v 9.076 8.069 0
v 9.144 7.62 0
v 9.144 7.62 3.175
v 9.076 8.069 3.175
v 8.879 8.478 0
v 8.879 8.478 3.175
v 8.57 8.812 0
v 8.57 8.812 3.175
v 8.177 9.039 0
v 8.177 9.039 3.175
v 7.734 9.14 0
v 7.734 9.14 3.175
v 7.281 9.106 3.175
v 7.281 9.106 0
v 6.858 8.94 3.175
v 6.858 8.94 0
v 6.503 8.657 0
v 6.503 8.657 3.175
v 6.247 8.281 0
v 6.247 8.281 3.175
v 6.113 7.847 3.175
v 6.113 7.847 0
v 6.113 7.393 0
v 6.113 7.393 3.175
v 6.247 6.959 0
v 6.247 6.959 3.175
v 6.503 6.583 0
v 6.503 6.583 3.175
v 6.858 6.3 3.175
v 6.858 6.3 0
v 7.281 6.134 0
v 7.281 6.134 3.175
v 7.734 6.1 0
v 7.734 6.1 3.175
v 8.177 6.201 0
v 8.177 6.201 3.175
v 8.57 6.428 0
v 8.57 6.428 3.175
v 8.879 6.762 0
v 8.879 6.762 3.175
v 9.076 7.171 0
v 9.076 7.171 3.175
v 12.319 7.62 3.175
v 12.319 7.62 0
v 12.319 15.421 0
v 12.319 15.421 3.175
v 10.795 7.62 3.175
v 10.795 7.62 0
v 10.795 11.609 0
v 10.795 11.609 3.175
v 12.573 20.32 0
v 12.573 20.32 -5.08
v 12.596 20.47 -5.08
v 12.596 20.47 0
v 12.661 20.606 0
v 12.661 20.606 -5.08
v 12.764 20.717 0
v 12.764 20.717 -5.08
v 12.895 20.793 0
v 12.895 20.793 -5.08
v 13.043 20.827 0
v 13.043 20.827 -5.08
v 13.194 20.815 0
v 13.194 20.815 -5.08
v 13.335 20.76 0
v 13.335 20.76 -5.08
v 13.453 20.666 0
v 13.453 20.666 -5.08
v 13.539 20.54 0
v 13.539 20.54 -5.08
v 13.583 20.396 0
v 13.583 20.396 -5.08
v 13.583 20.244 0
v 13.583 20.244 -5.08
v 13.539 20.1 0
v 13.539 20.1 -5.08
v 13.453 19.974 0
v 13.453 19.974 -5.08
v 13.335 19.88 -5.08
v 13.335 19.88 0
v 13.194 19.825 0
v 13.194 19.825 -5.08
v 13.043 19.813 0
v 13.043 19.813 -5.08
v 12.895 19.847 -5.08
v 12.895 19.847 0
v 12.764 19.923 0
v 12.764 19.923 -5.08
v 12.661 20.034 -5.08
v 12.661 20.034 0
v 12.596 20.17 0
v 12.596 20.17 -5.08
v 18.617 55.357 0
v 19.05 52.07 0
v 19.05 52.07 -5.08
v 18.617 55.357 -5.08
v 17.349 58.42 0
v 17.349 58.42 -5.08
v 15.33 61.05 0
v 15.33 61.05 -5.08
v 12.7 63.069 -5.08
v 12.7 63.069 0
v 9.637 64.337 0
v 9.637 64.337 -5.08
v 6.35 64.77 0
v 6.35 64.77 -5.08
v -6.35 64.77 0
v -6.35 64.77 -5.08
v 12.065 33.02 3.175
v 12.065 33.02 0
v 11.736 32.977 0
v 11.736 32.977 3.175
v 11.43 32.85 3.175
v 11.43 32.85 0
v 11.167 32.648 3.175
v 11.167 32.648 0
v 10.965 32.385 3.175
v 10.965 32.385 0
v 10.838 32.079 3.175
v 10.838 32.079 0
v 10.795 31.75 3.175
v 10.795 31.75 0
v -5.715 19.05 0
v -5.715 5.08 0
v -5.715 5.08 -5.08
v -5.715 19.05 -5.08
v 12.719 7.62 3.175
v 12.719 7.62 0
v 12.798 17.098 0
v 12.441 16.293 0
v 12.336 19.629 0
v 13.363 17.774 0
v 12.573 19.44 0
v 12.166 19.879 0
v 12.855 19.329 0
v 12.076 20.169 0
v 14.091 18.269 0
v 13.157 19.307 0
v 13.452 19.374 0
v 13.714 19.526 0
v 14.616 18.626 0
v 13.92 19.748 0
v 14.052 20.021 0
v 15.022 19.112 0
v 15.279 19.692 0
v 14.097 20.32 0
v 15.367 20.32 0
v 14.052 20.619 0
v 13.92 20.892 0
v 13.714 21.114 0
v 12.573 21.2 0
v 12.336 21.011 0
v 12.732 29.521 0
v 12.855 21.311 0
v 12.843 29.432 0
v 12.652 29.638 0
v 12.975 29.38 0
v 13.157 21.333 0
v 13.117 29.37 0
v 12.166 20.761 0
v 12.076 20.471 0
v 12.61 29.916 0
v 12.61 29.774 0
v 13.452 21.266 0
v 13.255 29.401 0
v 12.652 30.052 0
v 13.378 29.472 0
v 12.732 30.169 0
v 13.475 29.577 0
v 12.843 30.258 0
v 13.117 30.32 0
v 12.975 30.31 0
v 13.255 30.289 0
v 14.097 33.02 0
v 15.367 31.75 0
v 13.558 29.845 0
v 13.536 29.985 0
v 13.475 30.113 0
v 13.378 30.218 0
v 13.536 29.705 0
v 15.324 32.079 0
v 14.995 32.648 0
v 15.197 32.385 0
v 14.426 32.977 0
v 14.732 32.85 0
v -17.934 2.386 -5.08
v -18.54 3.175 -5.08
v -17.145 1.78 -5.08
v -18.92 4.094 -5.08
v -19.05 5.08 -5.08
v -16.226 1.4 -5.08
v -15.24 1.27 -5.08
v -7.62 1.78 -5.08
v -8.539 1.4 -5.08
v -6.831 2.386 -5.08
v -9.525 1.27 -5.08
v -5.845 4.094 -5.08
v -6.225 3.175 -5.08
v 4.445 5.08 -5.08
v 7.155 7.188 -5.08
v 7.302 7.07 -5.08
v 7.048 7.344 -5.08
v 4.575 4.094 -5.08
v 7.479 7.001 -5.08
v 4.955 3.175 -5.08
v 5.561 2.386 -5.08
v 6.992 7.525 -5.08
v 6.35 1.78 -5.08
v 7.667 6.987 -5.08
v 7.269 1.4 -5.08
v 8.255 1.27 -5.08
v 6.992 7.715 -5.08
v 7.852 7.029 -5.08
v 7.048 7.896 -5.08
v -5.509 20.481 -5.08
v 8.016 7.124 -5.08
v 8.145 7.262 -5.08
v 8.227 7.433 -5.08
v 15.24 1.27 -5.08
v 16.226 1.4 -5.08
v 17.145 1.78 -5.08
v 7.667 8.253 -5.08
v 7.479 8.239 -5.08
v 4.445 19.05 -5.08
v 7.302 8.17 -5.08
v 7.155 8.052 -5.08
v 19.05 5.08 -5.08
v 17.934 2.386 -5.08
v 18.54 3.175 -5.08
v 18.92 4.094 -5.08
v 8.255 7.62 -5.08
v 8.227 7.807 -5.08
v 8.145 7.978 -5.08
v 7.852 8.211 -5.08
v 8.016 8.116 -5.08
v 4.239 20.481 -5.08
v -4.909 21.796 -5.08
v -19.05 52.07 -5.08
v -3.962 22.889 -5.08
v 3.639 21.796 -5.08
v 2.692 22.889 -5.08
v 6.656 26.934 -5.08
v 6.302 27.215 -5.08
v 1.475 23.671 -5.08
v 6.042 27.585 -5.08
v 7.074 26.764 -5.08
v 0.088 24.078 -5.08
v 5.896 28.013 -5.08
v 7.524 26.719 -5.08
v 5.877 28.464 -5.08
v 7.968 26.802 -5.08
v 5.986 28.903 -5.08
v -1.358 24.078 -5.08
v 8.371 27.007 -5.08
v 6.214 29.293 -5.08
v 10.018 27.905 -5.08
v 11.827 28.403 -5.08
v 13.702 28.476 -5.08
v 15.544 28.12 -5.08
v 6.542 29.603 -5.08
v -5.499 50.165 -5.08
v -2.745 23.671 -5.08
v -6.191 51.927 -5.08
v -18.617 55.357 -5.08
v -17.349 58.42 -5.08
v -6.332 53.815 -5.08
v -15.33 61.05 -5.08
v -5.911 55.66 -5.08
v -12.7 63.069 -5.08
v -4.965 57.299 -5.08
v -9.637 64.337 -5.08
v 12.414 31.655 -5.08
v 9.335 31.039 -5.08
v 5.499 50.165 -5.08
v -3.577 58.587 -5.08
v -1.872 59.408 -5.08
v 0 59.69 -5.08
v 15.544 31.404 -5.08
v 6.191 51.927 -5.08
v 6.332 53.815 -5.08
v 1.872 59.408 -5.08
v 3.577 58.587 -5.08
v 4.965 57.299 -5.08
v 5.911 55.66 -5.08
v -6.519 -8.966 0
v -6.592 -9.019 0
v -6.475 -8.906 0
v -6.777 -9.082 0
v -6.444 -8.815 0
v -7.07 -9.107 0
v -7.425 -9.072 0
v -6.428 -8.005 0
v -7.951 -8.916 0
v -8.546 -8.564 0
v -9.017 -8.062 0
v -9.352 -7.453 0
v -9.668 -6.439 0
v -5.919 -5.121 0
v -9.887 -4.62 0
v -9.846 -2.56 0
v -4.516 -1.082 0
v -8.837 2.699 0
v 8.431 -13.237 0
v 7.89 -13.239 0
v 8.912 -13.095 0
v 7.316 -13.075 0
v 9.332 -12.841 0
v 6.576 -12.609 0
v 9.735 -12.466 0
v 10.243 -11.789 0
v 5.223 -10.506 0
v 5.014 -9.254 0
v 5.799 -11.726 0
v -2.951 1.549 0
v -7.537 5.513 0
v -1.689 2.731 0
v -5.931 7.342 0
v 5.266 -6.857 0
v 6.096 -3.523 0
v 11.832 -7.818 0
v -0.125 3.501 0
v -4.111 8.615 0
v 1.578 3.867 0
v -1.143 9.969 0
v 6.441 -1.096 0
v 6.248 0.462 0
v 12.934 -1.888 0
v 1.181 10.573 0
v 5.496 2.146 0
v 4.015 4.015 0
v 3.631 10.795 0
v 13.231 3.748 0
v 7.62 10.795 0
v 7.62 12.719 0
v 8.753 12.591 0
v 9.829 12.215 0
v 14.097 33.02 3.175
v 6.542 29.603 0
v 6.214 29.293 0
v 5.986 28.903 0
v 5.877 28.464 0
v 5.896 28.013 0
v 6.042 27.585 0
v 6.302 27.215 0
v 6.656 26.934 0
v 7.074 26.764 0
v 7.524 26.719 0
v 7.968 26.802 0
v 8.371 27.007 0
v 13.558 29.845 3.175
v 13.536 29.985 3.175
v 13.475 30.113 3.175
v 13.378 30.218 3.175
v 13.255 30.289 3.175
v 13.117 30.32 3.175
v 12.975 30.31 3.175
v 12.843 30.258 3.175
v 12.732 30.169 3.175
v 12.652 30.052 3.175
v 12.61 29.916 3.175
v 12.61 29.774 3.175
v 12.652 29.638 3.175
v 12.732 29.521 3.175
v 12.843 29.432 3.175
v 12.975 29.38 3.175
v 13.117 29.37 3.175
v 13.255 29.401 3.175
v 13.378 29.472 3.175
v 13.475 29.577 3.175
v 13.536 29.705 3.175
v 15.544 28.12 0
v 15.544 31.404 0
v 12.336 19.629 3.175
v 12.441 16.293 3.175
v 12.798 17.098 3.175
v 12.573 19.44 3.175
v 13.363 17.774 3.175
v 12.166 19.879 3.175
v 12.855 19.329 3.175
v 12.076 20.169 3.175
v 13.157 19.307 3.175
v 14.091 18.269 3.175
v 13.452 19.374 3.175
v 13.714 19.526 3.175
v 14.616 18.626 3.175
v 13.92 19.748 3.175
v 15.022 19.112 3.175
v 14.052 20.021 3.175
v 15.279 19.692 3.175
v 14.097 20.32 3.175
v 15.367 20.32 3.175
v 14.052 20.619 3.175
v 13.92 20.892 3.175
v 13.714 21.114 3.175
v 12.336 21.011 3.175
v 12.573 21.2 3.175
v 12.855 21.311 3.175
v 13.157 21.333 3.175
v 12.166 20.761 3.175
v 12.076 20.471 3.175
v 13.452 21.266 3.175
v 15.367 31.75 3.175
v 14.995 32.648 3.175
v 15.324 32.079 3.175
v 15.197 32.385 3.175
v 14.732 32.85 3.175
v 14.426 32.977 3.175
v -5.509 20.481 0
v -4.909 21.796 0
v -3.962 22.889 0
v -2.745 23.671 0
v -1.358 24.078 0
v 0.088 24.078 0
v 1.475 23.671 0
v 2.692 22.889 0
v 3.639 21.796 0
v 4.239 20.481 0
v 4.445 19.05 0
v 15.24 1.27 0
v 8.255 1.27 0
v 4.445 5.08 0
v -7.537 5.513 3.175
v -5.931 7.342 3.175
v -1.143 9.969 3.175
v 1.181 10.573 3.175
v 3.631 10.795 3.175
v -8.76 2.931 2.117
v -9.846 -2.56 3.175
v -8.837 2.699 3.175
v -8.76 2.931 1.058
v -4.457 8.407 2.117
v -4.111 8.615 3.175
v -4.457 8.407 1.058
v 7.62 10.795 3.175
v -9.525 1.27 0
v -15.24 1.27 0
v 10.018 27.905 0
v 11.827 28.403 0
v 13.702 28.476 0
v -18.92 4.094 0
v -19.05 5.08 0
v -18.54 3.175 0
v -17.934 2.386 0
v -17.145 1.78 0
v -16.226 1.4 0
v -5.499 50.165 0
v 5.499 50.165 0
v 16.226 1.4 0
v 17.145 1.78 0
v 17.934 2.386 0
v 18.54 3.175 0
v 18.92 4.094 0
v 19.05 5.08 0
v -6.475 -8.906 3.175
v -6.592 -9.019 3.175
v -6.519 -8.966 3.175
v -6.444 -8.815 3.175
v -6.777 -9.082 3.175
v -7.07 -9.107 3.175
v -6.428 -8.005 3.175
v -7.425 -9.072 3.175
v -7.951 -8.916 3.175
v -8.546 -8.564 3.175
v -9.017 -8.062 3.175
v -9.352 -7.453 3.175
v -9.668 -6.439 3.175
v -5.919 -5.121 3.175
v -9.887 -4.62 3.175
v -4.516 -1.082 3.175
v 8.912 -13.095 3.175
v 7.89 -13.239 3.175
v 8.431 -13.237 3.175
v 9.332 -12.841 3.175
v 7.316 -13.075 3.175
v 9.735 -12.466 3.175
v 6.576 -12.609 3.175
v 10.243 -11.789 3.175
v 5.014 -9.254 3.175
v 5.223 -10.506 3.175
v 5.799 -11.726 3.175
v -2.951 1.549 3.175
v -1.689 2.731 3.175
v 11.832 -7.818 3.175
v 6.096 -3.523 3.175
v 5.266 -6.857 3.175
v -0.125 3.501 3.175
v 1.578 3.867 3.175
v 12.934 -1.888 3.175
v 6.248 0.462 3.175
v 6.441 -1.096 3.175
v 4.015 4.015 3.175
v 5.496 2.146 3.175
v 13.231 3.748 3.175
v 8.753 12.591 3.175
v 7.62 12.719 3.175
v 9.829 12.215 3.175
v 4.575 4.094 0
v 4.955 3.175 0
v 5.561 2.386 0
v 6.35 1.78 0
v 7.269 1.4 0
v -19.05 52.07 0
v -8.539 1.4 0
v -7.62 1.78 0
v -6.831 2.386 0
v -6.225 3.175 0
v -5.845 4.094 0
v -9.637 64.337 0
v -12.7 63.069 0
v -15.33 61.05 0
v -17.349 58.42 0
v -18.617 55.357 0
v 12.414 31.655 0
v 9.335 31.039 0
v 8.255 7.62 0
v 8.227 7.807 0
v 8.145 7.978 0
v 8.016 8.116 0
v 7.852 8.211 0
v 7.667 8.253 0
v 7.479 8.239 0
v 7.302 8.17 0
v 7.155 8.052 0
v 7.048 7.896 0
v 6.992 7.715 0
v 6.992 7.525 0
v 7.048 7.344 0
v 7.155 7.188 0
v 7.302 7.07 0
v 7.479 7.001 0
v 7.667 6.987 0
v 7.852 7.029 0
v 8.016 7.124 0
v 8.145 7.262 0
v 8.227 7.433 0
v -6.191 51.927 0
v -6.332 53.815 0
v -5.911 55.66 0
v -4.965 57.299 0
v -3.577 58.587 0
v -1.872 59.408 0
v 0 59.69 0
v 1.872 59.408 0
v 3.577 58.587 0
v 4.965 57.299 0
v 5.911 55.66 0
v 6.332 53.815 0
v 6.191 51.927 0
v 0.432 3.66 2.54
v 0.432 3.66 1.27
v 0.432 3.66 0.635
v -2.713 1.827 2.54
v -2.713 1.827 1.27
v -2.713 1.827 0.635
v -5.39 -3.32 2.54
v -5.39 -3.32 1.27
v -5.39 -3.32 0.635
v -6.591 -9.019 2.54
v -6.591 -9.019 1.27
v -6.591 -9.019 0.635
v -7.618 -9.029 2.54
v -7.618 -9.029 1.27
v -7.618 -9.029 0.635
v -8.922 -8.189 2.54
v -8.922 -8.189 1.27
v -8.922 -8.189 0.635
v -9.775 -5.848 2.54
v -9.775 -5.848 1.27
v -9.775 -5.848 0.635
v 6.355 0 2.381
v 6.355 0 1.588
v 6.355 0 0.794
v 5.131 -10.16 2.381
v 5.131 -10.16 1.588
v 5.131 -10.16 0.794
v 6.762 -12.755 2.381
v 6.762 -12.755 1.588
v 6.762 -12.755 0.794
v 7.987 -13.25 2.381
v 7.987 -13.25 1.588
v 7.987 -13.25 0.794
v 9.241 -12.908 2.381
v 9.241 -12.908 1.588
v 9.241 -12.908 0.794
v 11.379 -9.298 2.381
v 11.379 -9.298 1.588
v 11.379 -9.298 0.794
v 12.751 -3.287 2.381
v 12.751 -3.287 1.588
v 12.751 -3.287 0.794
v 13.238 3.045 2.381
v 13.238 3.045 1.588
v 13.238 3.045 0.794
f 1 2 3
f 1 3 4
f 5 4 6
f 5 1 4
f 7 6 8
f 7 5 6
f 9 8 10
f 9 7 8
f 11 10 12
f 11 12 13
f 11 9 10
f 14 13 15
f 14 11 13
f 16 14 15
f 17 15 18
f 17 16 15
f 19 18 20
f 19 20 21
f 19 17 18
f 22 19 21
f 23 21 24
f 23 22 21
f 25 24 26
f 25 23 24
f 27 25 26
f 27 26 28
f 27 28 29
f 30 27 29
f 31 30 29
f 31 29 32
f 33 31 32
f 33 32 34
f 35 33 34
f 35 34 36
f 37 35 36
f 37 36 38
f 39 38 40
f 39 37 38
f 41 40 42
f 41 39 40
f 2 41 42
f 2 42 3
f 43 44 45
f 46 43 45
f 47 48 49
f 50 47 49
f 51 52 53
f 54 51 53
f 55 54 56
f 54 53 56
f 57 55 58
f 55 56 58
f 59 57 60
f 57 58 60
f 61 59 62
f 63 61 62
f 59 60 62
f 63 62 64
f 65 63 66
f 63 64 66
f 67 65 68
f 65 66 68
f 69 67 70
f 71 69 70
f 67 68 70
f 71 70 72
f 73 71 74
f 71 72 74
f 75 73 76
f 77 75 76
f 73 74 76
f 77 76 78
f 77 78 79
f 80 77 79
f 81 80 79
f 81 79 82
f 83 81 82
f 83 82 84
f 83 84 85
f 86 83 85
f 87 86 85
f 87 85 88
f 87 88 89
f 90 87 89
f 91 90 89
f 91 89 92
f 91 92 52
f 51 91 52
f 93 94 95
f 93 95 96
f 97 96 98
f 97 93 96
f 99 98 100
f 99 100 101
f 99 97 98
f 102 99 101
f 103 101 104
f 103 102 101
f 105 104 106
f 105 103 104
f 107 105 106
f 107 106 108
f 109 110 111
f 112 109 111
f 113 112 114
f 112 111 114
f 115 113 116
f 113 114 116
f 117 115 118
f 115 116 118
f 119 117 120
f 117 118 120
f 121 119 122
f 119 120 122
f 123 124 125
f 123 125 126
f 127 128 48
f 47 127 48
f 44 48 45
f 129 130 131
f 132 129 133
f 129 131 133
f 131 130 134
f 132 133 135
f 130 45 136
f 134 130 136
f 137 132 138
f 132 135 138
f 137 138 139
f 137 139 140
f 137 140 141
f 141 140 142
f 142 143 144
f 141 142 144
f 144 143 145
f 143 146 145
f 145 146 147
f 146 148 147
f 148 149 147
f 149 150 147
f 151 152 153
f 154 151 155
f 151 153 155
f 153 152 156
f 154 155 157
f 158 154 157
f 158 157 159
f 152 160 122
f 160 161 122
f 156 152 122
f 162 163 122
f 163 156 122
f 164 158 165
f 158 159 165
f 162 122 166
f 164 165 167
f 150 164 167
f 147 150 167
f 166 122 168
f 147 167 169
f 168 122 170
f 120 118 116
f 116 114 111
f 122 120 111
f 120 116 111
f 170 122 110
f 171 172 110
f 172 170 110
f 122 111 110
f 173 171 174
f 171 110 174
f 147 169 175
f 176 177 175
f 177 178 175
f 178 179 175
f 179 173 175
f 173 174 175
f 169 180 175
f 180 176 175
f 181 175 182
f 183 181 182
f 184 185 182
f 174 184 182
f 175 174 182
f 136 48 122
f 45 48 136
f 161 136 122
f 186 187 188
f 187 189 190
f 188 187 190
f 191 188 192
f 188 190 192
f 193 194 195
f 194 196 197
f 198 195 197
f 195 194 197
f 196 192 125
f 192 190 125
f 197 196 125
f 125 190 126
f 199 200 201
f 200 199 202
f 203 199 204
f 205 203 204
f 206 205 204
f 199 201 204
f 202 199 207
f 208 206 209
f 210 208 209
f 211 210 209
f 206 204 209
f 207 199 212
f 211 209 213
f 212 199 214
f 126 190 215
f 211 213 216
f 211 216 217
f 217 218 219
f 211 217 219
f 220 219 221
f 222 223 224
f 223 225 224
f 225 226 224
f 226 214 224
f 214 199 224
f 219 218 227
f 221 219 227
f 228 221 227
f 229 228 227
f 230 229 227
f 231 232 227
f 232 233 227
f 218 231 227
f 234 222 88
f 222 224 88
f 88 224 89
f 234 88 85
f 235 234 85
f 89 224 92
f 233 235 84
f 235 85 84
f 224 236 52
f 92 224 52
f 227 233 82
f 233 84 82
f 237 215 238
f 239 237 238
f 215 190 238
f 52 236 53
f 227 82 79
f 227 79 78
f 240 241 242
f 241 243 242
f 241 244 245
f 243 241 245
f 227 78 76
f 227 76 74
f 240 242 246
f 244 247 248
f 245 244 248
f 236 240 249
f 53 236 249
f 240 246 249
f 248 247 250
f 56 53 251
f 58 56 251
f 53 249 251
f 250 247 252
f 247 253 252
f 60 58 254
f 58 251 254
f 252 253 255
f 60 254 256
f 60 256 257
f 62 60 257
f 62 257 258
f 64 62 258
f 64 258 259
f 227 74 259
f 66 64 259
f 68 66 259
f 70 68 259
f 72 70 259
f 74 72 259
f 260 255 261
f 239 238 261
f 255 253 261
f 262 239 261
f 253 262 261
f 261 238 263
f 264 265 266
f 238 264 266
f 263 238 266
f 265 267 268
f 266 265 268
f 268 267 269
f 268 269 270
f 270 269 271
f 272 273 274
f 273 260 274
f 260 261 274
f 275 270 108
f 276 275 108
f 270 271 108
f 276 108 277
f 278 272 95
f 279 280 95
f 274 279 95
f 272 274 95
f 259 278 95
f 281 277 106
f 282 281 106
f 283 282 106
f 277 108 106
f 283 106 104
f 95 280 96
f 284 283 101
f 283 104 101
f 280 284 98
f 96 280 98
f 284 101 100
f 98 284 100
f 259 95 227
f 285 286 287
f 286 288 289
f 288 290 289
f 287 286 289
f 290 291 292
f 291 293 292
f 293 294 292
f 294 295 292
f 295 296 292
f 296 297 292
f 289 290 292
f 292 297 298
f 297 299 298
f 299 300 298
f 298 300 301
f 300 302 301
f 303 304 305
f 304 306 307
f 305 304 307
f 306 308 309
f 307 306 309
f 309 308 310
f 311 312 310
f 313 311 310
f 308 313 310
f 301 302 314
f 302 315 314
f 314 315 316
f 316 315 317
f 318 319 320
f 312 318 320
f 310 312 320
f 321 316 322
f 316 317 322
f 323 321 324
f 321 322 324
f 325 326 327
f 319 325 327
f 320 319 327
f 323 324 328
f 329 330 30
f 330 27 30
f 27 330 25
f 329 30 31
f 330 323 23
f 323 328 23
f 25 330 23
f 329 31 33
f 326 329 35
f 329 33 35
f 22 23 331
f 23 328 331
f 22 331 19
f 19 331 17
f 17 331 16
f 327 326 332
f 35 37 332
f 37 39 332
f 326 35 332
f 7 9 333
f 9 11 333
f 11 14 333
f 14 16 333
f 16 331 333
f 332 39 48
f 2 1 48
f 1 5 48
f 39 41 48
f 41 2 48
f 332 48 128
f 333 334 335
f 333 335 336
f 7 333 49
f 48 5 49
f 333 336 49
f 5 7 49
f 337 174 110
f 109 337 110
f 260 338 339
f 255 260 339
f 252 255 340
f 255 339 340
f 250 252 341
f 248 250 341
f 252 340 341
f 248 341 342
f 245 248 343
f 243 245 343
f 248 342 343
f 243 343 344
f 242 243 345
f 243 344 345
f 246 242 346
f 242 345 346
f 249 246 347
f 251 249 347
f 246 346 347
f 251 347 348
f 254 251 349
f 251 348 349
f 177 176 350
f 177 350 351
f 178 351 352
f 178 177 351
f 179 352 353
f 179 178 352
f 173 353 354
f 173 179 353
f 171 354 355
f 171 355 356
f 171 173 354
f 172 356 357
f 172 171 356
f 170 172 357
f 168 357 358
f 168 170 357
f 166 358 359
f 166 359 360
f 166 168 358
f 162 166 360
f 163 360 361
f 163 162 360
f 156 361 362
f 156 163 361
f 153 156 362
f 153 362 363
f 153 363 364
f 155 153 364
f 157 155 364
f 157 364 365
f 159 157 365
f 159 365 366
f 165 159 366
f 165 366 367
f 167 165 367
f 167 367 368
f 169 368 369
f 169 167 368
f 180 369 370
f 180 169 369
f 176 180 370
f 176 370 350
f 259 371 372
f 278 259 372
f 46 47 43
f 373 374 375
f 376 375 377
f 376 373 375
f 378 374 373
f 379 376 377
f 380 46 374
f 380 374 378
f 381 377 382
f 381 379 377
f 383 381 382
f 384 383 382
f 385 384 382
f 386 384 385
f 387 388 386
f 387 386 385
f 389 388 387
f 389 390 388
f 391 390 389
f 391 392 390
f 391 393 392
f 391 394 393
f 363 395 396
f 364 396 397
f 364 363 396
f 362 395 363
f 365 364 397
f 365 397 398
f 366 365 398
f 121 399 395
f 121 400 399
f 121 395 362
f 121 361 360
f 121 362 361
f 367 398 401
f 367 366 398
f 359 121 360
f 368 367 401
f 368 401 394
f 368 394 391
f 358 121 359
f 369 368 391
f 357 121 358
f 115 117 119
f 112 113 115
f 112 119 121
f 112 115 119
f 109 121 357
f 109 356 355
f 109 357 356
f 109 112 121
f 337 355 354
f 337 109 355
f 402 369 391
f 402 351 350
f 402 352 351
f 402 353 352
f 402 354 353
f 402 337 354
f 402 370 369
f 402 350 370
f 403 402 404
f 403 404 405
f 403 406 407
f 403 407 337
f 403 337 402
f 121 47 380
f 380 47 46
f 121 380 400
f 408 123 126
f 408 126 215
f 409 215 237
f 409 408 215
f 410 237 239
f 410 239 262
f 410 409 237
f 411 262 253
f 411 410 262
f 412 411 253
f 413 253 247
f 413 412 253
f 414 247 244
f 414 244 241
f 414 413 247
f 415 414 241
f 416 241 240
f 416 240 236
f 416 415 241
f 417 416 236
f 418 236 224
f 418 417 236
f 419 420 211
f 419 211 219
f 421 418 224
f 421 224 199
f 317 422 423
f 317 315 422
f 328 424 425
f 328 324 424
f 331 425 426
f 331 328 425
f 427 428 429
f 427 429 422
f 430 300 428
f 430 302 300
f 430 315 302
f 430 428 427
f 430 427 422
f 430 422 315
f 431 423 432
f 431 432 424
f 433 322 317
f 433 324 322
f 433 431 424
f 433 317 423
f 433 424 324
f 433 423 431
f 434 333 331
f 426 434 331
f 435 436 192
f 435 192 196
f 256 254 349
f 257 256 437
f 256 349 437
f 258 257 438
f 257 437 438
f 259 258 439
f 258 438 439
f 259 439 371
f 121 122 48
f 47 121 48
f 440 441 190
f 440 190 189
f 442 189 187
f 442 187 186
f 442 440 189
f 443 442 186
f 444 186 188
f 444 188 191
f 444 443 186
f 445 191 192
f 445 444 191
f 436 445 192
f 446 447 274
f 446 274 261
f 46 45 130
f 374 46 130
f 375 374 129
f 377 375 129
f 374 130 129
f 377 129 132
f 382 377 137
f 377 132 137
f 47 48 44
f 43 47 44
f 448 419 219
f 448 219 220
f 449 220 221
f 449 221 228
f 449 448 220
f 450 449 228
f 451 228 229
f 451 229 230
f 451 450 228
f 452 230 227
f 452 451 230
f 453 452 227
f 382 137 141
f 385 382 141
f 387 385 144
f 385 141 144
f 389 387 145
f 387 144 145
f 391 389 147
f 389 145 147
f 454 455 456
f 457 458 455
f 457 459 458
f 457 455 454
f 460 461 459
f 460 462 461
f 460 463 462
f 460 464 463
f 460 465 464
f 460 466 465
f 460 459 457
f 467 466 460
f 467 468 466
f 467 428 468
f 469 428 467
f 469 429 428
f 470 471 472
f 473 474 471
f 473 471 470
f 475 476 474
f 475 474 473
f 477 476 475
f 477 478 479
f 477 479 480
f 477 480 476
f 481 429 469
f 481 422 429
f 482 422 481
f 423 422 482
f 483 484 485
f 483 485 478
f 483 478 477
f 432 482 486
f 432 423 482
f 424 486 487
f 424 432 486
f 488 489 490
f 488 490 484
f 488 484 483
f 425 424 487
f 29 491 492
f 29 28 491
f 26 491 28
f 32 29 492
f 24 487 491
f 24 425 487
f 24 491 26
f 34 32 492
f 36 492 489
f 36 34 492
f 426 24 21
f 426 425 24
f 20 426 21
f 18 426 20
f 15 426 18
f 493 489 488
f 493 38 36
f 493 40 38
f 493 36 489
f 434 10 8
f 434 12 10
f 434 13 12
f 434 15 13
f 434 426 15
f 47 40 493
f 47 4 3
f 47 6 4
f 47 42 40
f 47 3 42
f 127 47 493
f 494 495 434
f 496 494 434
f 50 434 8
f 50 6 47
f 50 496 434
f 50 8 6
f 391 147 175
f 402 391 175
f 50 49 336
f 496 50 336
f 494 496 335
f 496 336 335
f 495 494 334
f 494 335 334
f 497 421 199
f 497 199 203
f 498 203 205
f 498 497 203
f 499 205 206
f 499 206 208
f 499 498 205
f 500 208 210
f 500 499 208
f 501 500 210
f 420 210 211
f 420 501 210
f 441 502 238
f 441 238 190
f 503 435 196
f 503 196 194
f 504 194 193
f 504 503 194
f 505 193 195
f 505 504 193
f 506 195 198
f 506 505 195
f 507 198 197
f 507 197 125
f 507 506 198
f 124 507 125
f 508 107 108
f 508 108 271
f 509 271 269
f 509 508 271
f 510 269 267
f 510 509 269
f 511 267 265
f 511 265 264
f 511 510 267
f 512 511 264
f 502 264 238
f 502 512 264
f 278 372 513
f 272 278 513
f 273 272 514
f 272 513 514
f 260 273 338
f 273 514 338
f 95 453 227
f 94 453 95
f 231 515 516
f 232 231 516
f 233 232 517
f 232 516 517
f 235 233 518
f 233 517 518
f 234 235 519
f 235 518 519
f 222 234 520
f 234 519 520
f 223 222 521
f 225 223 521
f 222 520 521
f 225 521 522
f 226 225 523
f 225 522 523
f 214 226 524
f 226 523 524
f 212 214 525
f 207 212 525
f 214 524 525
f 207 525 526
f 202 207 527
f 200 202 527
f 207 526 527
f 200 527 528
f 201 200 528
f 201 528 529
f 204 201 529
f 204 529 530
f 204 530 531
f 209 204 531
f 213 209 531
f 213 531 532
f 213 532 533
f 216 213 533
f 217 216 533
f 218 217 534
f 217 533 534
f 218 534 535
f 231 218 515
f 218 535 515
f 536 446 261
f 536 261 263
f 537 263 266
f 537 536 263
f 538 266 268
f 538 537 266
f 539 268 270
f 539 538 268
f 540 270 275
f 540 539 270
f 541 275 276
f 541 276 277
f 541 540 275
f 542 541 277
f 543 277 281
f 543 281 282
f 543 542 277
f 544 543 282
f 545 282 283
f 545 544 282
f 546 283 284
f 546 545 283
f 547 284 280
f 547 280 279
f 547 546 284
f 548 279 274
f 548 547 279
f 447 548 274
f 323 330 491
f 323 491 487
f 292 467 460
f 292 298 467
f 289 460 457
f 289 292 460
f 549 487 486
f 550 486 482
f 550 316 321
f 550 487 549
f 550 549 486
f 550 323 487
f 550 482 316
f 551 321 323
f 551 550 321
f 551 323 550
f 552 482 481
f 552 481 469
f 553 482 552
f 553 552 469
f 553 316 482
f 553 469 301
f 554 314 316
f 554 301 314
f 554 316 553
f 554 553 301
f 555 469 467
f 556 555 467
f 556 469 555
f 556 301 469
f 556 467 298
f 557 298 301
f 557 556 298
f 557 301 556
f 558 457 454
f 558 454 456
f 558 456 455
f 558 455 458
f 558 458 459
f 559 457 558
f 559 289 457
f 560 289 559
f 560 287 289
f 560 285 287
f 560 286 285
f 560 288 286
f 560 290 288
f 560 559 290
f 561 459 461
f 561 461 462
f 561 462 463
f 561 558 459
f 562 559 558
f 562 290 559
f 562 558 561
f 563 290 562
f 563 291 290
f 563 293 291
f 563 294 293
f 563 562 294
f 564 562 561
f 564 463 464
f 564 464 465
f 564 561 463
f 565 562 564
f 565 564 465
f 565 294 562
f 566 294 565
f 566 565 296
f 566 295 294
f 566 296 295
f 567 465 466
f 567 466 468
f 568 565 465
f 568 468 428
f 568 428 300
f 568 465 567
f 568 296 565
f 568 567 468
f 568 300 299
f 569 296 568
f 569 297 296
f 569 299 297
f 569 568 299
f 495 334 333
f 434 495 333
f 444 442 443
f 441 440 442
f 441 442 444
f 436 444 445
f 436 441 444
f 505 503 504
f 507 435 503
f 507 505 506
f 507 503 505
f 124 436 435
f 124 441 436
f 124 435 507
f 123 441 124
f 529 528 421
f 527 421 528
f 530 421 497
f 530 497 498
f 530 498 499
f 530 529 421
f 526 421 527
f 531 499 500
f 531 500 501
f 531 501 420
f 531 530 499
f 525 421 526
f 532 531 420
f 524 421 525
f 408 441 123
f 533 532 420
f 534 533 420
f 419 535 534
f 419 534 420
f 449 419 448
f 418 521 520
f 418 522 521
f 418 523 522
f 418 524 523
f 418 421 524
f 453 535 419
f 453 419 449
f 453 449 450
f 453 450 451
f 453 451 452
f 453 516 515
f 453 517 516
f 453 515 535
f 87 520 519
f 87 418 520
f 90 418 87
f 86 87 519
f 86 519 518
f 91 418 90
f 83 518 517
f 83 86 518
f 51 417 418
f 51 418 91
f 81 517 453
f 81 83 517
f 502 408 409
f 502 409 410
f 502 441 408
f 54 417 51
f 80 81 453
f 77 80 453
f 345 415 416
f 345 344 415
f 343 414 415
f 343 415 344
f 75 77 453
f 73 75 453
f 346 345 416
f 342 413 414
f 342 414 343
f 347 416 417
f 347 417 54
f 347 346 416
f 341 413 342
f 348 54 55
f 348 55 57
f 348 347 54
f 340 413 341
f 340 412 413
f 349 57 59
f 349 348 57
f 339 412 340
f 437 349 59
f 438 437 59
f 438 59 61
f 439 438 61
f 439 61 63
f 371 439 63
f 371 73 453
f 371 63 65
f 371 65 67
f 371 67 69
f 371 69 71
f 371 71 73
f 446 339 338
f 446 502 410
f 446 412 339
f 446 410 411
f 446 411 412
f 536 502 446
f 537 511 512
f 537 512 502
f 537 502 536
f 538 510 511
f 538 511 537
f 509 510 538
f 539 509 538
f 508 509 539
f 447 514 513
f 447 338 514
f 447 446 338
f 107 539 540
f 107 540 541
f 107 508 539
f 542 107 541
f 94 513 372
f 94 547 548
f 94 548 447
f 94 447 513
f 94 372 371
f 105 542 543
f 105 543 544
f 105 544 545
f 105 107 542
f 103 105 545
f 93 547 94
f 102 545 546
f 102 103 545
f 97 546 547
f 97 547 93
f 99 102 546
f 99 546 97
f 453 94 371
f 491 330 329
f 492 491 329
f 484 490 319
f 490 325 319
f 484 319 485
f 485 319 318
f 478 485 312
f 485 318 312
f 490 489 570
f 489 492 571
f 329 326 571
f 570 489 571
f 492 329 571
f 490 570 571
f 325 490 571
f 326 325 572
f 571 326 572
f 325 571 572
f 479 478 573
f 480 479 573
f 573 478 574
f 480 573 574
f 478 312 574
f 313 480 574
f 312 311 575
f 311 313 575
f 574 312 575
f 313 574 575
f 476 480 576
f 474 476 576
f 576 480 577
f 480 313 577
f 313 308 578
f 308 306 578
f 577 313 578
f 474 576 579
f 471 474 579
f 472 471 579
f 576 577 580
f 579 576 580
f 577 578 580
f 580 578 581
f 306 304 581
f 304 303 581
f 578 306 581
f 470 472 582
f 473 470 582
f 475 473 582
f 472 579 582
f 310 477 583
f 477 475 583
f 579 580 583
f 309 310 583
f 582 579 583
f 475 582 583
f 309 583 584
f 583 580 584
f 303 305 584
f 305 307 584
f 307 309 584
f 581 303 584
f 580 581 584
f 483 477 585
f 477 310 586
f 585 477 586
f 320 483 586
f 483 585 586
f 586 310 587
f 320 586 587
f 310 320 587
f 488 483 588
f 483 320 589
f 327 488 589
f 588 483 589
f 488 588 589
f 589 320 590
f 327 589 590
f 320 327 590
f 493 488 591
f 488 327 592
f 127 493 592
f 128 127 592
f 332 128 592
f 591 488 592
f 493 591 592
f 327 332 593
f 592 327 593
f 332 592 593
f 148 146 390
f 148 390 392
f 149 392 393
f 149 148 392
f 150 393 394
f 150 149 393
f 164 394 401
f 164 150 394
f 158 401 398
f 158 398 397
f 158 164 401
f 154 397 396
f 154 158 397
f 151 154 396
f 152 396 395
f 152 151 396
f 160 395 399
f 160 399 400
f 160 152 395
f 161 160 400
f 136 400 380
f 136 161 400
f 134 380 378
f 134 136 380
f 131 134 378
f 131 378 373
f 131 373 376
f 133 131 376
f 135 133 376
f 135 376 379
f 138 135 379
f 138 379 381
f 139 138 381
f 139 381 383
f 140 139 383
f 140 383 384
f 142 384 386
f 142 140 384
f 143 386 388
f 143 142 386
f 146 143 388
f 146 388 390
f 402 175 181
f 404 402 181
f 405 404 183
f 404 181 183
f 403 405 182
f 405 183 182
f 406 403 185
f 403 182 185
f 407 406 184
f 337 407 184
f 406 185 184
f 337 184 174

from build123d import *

# Parameters (mm, degrees)
F0_R     = 1.524
F1_DEPTH = 3.175
F2_R     = 0.635
F3_DEPTH = 5.08
F4_R     = 1.016
F4_R_2   = 0.4765946888
F5_DEPTH = 3.175
F6_D     = 1.016
F8_DEPTH = 25.4


with BuildPart() as f1:
    # F0 (on Top) → F1 (new body)
    with BuildSketch(Plane.XY):
        with BuildLine():
            add(Edge.make_bspline(
                [(4.0146798487, 4.0146798487), (4.1965253446, 3.8388911287), (8.6034145204, -0.4632855785), (2.7081005667, -9.8256704348), (11.7725199973, -17.5553609081), (14.1365779009, 3.6148799922), (12.7186926547, 7.62)],
                knots=[0.342546698, 0.342546698, 0.342546698, 0.342546698, 0.4592804701, 0.6325061967, 0.7529179928, 1, 1, 1, 1], degree=3))
            Line((12.7186926547, 7.62), (10.795, 7.62))
            Line((10.795, 7.62), (10.795, 11.6094914196))
            ThreePointArc((10.795, 11.6094914196), (9.3015879683, 12.4334113363), (7.62, 12.7186926547))
            Line((7.62, 12.7186926547), (7.62, 10.795))
            Line((7.62, 10.795), (3.6305085804, 10.795))
            add(Edge.make_bspline(
                [(-9.8462747246, -2.5595309993), (-9.7056248656, -0.6525965961), (-8.5851336869, 4.887523046), (-4.9223199156, 8.8010582074), (0.6214204647, 10.795), (3.6305085804, 10.795)],
                knots=[0.5944478908, 0.5944478908, 0.5944478908, 0.5944478908, 0.6806042793, 0.8326685389, 1, 1, 1, 1], degree=3))
            add(Edge.make_bspline(
                [(-9.8462747246, -2.5595309993), (-8.3692950914, 1.0159390836), (-1.2709087492, 7.2679963496), (3.9839462531, 4.0422517138), (3.9949946041, 4.0337094316), (4.0146798487, 4.0146798487)],
                knots=[0.0522687231, 0.0522687231, 0.0522687231, 0.0522687231, 0.2064144516, 0.3299099657, 0.342546698, 0.342546698, 0.342546698, 0.342546698], degree=3))
        make_face()
        with Locations((7.62, 7.62)):
            Circle(F0_R, mode=Mode.SUBTRACT)
        with BuildLine():
            add(Edge.make_bspline(
                [(4.0146798487, 4.0146798487), (1.5786877312, 3.9404286991), (-3.8406877482, 3.7898553775), (-6.77720019, -7.7849709454), (-6.196463978, -9.2958597248), (-9.5973471823, -8.9863377062), (-10.0193170502, -4.9056432962), (-9.8462747246, -2.5595309993)],
                knots=[0, 0, 0, 0, 0.1532538956, 0.3403377332, 0.3978065221, 0.4884491935, 0.5944478908, 0.5944478908, 0.5944478908, 0.5944478908], degree=3))
            add(Edge.make_bspline(
                [(-9.8462747246, -2.5595309993), (-8.3692950914, 1.0159390836), (-1.2709087492, 7.2679963496), (3.9839462531, 4.0422517138), (3.9949946041, 4.0337094316), (4.0146798487, 4.0146798487)],
                knots=[0.0522687231, 0.0522687231, 0.0522687231, 0.0522687231, 0.2064144516, 0.3299099657, 0.342546698, 0.342546698, 0.342546698, 0.342546698], degree=3))
        make_face()
    extrude(amount=F1_DEPTH)


with BuildPart() as f3:
    # F2 (on Top) → F3 (new body)
    with BuildSketch(Plane.XY):
        with BuildLine():
            Line((6.35, 64.77), (-6.35, 64.77))
            ThreePointArc((-6.35, 64.77), (-15.3302561211, 61.0502561211), (-19.05, 52.07))
            Line((-19.05, 52.07), (-19.05, 5.08))
            ThreePointArc((-19.05, 5.08), (-17.9340768363, 2.3859231637), (-15.24, 1.27))
            Line((-15.24, 1.27), (-9.525, 1.27))
            ThreePointArc((-9.525, 1.27), (-6.8309231637, 2.3859231637), (-5.715, 5.08))
            Line((-5.715, 5.08), (-5.715, 19.05))
            ThreePointArc((-5.715, 19.05), (-0.635, 24.13), (4.445, 19.05))
            Line((4.445, 19.05), (4.445, 5.08))
            ThreePointArc((4.445, 5.08), (5.5609231637, 2.3859231637), (8.255, 1.27))
            Line((8.255, 1.27), (15.24, 1.27))
            ThreePointArc((15.24, 1.27), (17.9340768363, 2.3859231637), (19.05, 5.08))
            Line((19.05, 5.08), (19.05, 52.07))
            ThreePointArc((19.05, 52.07), (15.3302561211, 61.0502561211), (6.35, 64.77))
        make_face()
        with Locations((7.62, 7.62)):
            Circle(F2_R, mode=Mode.SUBTRACT)
        with BuildLine():
            ThreePointArc((-5.499261314, 50.165), (0, 59.69), (5.499261314, 50.165))
            Line((5.499261314, 50.165), (-5.499261314, 50.165))
        make_face(mode=Mode.SUBTRACT)
    extrude(amount=-F3_DEPTH)

    # F6 (through all)
    with Locations(Plane.XY):
        with Locations((13.081, 20.32)):
            Hole(F6_D / 2)

    # F7 (on face) → F8 (cut)
    with BuildSketch(Plane.XY):
        with BuildLine():
            Line((15.5435356842, 28.1201432546), (15.5435356842, 31.4043808392))
            ThreePointArc((15.5435356842, 31.4043808392), (10.8526970709, 31.4538334208), (6.542203401, 29.6028723799))
            ThreePointArc((6.542203401, 29.6028723799), (6.1585518853, 27.3908316899), (8.3705925754, 27.0071801742))
            ThreePointArc((8.3705925754, 27.0071801742), (11.826845486, 28.4029087118), (15.5435356842, 28.1201432546))
        make_face()
    extrude(amount=-F8_DEPTH, mode=Mode.SUBTRACT)


with BuildPart() as f5:
    # F4 (on face) → F5 (new body)
    with BuildSketch(Plane.XY):
        with BuildLine():
            Line((10.795, 31.75), (10.795, 7.62))
            Line((10.795, 7.62), (12.319, 7.62))
            Line((12.319, 7.62), (12.319, 15.4210254134))
            ThreePointArc((12.319, 15.4210254134), (12.7981833657, 17.09828439), (14.0910930233, 18.2692664521))
            ThreePointArc((14.0910930233, 18.2692664521), (15.0219879767, 19.1123735369), (15.367, 20.32))
            Line((15.367, 20.32), (15.367, 31.75))
            ThreePointArc((15.367, 31.75), (14.9950256121, 32.6480256121), (14.097, 33.02))
            Line((14.097, 33.02), (12.065, 33.02))
            ThreePointArc((12.065, 33.02), (11.1669743879, 32.6480256121), (10.795, 31.75))
        make_face()
        with Locations((13.081, 20.32)):
            Circle(F4_R, mode=Mode.SUBTRACT)
        with Locations((13.081, 29.845)):
            Circle(F4_R_2, mode=Mode.SUBTRACT)
    extrude(amount=F5_DEPTH)


solid = Compound([f1.part, f3.part, f5.part])
